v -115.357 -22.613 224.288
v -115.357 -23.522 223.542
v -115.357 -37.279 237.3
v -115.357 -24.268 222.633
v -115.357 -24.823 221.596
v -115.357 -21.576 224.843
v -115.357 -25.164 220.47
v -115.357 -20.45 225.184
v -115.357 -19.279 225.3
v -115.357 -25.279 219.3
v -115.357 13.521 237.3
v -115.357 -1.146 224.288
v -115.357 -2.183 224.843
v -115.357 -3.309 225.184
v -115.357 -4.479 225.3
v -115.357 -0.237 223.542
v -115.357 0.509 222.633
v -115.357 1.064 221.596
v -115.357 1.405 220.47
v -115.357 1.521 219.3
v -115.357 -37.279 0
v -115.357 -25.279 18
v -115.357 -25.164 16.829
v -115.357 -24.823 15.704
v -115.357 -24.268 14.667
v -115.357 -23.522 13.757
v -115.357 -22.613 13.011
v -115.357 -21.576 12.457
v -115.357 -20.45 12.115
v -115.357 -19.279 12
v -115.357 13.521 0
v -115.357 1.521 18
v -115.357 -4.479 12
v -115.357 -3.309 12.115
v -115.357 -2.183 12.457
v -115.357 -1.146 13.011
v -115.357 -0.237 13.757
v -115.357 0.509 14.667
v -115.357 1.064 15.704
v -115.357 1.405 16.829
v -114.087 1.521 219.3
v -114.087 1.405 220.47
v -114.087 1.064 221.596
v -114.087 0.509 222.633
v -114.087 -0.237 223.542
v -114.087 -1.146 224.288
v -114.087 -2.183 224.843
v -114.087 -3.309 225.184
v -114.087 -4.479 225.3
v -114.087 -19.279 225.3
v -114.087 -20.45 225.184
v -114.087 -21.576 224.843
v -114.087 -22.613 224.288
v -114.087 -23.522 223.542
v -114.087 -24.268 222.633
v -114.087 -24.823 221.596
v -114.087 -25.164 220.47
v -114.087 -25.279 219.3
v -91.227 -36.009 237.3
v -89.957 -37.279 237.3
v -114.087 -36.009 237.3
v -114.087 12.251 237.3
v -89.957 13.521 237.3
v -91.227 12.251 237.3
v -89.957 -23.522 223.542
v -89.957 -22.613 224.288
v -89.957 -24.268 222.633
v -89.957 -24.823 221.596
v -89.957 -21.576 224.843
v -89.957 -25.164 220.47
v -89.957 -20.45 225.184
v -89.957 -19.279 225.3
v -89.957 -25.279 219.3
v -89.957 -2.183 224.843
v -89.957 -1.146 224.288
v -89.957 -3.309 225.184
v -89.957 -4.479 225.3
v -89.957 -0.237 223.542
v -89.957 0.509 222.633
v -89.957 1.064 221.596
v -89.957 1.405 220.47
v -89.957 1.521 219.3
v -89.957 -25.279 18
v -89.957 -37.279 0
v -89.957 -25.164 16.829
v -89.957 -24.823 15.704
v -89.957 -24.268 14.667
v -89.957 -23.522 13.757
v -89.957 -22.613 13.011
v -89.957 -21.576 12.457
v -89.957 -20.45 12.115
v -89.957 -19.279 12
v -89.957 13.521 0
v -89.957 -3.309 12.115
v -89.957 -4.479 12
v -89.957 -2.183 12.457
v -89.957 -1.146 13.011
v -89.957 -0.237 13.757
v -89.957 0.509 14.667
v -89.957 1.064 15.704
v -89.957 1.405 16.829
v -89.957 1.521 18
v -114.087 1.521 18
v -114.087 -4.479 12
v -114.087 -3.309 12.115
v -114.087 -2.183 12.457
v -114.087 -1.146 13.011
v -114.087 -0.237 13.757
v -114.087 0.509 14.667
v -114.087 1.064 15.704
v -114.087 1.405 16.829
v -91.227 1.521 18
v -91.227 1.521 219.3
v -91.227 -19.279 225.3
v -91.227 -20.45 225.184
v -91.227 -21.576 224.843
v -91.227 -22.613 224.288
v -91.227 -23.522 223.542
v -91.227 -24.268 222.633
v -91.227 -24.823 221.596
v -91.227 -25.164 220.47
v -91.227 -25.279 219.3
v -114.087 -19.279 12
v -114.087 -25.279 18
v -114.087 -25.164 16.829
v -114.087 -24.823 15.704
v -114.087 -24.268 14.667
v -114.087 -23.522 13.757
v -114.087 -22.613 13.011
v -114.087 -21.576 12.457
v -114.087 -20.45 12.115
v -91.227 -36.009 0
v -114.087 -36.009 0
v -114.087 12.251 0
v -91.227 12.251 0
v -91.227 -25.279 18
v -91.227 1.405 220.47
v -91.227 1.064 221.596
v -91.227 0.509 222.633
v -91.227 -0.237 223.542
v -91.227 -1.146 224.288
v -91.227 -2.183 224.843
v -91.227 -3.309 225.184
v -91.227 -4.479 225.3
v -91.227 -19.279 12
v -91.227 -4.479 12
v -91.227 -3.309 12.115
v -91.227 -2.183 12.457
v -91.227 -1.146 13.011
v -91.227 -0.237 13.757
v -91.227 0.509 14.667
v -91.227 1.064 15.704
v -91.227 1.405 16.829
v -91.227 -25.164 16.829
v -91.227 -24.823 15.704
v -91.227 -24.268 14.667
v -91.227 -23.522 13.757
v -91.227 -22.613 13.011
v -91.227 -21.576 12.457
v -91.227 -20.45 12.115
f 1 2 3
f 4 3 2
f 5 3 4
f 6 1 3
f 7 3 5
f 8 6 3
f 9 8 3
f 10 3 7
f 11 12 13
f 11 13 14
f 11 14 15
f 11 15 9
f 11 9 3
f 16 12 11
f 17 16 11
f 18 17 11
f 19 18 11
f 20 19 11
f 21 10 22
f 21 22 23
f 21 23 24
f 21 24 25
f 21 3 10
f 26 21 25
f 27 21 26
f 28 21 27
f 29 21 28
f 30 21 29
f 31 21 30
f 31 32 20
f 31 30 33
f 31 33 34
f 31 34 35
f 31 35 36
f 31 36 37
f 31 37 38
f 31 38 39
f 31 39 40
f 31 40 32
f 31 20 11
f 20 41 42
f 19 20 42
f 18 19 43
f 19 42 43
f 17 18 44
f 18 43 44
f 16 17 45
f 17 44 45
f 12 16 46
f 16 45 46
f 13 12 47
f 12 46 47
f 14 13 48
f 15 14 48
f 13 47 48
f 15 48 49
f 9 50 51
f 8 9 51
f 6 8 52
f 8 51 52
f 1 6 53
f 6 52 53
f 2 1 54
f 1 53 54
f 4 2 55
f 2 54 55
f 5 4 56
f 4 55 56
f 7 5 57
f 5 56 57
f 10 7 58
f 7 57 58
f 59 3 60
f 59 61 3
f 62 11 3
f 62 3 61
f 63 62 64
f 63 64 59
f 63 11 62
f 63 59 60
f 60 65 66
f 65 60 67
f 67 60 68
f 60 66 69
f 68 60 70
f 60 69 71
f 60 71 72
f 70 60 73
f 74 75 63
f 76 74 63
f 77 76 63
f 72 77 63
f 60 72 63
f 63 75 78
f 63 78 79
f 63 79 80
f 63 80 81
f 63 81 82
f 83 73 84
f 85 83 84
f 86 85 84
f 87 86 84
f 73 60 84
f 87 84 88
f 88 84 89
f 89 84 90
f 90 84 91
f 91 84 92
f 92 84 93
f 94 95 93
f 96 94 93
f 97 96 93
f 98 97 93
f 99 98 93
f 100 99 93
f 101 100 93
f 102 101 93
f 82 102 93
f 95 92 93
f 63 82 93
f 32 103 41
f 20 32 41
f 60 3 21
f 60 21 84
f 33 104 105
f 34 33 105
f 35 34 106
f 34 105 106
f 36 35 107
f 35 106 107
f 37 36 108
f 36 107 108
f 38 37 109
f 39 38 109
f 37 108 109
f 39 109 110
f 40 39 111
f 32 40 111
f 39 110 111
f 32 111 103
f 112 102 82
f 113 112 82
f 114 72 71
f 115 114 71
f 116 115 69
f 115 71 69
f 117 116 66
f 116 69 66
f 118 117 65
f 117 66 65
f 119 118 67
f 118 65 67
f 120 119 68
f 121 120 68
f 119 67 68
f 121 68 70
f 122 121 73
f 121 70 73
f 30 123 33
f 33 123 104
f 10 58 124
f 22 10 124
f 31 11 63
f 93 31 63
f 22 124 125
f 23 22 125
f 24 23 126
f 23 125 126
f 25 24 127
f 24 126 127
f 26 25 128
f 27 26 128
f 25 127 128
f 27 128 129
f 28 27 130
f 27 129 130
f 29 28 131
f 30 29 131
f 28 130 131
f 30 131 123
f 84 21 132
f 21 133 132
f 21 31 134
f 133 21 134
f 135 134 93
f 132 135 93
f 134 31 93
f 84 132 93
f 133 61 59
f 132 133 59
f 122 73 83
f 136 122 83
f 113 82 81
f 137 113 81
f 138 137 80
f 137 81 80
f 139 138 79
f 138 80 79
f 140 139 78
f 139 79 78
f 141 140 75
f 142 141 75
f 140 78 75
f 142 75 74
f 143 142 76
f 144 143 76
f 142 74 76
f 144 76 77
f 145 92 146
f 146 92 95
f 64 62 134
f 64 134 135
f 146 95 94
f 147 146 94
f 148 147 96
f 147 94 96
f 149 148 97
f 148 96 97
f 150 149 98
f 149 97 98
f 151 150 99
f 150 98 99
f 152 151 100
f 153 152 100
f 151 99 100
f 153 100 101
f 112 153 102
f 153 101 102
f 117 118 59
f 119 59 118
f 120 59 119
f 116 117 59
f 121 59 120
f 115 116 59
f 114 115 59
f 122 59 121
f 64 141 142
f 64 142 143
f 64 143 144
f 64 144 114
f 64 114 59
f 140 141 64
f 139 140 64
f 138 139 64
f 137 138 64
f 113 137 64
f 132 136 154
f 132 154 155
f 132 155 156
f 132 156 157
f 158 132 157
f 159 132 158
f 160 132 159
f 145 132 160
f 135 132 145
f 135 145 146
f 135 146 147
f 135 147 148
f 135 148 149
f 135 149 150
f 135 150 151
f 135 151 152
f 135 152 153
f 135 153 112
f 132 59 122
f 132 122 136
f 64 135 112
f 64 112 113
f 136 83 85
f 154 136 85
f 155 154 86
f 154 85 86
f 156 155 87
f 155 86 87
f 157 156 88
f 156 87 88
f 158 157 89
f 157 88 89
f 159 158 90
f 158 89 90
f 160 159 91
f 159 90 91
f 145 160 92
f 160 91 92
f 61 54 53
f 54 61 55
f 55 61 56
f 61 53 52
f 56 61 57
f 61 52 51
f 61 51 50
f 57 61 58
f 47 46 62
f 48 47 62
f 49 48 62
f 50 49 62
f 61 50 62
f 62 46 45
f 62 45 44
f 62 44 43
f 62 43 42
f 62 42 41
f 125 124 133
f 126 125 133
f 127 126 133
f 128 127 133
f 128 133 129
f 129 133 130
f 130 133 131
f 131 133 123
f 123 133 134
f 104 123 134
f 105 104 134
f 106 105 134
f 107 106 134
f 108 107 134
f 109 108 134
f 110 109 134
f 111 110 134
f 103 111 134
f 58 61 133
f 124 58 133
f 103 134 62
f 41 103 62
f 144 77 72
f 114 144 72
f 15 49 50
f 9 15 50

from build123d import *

# Parameters (mm, degrees)
SKETCH1_W           = 25.4
SKETCH1_H           = 50.8
SKETCH1_W_2         = 22.86
SKETCH1_H_2         = 48.26
BOSS_EXTRUDE1_DEPTH = 237.2995
CUT_EXTRUDE5_DEPTH  = 26.4


with BuildPart() as part:
    # Sketch1 → Boss-Extrude1 (new body)
    with BuildSketch(Plane.XY):
        with Locations((-102.657065342, -11.879495554)):
            Rectangle(SKETCH1_W, SKETCH1_H)
        with Locations((-102.657065342, -11.879495554)):
            Rectangle(SKETCH1_W_2, SKETCH1_H_2, mode=Mode.SUBTRACT)
    extrude(amount=BOSS_EXTRUDE1_DEPTH)

    # Sketch4 → Cut-Extrude5 (cut, through all)
    with BuildSketch(Plane(origin=(-89.957065342, 0, 0), x_dir=(0, 0, -1), z_dir=(1, 0, 0))):
        with BuildLine():
            Line((-18, 1.520504446), (-219.2995, 1.520504446))
            ThreePointArc((-219.2995, 1.520504446), (-223.542140687, -0.236854867), (-225.2995, -4.479495554))
            Line((-225.2995, -4.479495554), (-225.2995, -19.279495554))
            ThreePointArc((-225.2995, -19.279495554), (-223.542140687, -23.522136241), (-219.2995, -25.279495554))
            Line((-219.2995, -25.279495554), (-18, -25.279495554))
            ThreePointArc((-18, -25.279495554), (-13.757359313, -23.522136241), (-12, -19.279495554))
            Line((-12, -19.279495554), (-12, -4.479495554))
            ThreePointArc((-12, -4.479495554), (-13.757359313, -0.236854867), (-18, 1.520504446))
        make_face()
    extrude(amount=-CUT_EXTRUDE5_DEPTH, mode=Mode.SUBTRACT)


solid = part.part
